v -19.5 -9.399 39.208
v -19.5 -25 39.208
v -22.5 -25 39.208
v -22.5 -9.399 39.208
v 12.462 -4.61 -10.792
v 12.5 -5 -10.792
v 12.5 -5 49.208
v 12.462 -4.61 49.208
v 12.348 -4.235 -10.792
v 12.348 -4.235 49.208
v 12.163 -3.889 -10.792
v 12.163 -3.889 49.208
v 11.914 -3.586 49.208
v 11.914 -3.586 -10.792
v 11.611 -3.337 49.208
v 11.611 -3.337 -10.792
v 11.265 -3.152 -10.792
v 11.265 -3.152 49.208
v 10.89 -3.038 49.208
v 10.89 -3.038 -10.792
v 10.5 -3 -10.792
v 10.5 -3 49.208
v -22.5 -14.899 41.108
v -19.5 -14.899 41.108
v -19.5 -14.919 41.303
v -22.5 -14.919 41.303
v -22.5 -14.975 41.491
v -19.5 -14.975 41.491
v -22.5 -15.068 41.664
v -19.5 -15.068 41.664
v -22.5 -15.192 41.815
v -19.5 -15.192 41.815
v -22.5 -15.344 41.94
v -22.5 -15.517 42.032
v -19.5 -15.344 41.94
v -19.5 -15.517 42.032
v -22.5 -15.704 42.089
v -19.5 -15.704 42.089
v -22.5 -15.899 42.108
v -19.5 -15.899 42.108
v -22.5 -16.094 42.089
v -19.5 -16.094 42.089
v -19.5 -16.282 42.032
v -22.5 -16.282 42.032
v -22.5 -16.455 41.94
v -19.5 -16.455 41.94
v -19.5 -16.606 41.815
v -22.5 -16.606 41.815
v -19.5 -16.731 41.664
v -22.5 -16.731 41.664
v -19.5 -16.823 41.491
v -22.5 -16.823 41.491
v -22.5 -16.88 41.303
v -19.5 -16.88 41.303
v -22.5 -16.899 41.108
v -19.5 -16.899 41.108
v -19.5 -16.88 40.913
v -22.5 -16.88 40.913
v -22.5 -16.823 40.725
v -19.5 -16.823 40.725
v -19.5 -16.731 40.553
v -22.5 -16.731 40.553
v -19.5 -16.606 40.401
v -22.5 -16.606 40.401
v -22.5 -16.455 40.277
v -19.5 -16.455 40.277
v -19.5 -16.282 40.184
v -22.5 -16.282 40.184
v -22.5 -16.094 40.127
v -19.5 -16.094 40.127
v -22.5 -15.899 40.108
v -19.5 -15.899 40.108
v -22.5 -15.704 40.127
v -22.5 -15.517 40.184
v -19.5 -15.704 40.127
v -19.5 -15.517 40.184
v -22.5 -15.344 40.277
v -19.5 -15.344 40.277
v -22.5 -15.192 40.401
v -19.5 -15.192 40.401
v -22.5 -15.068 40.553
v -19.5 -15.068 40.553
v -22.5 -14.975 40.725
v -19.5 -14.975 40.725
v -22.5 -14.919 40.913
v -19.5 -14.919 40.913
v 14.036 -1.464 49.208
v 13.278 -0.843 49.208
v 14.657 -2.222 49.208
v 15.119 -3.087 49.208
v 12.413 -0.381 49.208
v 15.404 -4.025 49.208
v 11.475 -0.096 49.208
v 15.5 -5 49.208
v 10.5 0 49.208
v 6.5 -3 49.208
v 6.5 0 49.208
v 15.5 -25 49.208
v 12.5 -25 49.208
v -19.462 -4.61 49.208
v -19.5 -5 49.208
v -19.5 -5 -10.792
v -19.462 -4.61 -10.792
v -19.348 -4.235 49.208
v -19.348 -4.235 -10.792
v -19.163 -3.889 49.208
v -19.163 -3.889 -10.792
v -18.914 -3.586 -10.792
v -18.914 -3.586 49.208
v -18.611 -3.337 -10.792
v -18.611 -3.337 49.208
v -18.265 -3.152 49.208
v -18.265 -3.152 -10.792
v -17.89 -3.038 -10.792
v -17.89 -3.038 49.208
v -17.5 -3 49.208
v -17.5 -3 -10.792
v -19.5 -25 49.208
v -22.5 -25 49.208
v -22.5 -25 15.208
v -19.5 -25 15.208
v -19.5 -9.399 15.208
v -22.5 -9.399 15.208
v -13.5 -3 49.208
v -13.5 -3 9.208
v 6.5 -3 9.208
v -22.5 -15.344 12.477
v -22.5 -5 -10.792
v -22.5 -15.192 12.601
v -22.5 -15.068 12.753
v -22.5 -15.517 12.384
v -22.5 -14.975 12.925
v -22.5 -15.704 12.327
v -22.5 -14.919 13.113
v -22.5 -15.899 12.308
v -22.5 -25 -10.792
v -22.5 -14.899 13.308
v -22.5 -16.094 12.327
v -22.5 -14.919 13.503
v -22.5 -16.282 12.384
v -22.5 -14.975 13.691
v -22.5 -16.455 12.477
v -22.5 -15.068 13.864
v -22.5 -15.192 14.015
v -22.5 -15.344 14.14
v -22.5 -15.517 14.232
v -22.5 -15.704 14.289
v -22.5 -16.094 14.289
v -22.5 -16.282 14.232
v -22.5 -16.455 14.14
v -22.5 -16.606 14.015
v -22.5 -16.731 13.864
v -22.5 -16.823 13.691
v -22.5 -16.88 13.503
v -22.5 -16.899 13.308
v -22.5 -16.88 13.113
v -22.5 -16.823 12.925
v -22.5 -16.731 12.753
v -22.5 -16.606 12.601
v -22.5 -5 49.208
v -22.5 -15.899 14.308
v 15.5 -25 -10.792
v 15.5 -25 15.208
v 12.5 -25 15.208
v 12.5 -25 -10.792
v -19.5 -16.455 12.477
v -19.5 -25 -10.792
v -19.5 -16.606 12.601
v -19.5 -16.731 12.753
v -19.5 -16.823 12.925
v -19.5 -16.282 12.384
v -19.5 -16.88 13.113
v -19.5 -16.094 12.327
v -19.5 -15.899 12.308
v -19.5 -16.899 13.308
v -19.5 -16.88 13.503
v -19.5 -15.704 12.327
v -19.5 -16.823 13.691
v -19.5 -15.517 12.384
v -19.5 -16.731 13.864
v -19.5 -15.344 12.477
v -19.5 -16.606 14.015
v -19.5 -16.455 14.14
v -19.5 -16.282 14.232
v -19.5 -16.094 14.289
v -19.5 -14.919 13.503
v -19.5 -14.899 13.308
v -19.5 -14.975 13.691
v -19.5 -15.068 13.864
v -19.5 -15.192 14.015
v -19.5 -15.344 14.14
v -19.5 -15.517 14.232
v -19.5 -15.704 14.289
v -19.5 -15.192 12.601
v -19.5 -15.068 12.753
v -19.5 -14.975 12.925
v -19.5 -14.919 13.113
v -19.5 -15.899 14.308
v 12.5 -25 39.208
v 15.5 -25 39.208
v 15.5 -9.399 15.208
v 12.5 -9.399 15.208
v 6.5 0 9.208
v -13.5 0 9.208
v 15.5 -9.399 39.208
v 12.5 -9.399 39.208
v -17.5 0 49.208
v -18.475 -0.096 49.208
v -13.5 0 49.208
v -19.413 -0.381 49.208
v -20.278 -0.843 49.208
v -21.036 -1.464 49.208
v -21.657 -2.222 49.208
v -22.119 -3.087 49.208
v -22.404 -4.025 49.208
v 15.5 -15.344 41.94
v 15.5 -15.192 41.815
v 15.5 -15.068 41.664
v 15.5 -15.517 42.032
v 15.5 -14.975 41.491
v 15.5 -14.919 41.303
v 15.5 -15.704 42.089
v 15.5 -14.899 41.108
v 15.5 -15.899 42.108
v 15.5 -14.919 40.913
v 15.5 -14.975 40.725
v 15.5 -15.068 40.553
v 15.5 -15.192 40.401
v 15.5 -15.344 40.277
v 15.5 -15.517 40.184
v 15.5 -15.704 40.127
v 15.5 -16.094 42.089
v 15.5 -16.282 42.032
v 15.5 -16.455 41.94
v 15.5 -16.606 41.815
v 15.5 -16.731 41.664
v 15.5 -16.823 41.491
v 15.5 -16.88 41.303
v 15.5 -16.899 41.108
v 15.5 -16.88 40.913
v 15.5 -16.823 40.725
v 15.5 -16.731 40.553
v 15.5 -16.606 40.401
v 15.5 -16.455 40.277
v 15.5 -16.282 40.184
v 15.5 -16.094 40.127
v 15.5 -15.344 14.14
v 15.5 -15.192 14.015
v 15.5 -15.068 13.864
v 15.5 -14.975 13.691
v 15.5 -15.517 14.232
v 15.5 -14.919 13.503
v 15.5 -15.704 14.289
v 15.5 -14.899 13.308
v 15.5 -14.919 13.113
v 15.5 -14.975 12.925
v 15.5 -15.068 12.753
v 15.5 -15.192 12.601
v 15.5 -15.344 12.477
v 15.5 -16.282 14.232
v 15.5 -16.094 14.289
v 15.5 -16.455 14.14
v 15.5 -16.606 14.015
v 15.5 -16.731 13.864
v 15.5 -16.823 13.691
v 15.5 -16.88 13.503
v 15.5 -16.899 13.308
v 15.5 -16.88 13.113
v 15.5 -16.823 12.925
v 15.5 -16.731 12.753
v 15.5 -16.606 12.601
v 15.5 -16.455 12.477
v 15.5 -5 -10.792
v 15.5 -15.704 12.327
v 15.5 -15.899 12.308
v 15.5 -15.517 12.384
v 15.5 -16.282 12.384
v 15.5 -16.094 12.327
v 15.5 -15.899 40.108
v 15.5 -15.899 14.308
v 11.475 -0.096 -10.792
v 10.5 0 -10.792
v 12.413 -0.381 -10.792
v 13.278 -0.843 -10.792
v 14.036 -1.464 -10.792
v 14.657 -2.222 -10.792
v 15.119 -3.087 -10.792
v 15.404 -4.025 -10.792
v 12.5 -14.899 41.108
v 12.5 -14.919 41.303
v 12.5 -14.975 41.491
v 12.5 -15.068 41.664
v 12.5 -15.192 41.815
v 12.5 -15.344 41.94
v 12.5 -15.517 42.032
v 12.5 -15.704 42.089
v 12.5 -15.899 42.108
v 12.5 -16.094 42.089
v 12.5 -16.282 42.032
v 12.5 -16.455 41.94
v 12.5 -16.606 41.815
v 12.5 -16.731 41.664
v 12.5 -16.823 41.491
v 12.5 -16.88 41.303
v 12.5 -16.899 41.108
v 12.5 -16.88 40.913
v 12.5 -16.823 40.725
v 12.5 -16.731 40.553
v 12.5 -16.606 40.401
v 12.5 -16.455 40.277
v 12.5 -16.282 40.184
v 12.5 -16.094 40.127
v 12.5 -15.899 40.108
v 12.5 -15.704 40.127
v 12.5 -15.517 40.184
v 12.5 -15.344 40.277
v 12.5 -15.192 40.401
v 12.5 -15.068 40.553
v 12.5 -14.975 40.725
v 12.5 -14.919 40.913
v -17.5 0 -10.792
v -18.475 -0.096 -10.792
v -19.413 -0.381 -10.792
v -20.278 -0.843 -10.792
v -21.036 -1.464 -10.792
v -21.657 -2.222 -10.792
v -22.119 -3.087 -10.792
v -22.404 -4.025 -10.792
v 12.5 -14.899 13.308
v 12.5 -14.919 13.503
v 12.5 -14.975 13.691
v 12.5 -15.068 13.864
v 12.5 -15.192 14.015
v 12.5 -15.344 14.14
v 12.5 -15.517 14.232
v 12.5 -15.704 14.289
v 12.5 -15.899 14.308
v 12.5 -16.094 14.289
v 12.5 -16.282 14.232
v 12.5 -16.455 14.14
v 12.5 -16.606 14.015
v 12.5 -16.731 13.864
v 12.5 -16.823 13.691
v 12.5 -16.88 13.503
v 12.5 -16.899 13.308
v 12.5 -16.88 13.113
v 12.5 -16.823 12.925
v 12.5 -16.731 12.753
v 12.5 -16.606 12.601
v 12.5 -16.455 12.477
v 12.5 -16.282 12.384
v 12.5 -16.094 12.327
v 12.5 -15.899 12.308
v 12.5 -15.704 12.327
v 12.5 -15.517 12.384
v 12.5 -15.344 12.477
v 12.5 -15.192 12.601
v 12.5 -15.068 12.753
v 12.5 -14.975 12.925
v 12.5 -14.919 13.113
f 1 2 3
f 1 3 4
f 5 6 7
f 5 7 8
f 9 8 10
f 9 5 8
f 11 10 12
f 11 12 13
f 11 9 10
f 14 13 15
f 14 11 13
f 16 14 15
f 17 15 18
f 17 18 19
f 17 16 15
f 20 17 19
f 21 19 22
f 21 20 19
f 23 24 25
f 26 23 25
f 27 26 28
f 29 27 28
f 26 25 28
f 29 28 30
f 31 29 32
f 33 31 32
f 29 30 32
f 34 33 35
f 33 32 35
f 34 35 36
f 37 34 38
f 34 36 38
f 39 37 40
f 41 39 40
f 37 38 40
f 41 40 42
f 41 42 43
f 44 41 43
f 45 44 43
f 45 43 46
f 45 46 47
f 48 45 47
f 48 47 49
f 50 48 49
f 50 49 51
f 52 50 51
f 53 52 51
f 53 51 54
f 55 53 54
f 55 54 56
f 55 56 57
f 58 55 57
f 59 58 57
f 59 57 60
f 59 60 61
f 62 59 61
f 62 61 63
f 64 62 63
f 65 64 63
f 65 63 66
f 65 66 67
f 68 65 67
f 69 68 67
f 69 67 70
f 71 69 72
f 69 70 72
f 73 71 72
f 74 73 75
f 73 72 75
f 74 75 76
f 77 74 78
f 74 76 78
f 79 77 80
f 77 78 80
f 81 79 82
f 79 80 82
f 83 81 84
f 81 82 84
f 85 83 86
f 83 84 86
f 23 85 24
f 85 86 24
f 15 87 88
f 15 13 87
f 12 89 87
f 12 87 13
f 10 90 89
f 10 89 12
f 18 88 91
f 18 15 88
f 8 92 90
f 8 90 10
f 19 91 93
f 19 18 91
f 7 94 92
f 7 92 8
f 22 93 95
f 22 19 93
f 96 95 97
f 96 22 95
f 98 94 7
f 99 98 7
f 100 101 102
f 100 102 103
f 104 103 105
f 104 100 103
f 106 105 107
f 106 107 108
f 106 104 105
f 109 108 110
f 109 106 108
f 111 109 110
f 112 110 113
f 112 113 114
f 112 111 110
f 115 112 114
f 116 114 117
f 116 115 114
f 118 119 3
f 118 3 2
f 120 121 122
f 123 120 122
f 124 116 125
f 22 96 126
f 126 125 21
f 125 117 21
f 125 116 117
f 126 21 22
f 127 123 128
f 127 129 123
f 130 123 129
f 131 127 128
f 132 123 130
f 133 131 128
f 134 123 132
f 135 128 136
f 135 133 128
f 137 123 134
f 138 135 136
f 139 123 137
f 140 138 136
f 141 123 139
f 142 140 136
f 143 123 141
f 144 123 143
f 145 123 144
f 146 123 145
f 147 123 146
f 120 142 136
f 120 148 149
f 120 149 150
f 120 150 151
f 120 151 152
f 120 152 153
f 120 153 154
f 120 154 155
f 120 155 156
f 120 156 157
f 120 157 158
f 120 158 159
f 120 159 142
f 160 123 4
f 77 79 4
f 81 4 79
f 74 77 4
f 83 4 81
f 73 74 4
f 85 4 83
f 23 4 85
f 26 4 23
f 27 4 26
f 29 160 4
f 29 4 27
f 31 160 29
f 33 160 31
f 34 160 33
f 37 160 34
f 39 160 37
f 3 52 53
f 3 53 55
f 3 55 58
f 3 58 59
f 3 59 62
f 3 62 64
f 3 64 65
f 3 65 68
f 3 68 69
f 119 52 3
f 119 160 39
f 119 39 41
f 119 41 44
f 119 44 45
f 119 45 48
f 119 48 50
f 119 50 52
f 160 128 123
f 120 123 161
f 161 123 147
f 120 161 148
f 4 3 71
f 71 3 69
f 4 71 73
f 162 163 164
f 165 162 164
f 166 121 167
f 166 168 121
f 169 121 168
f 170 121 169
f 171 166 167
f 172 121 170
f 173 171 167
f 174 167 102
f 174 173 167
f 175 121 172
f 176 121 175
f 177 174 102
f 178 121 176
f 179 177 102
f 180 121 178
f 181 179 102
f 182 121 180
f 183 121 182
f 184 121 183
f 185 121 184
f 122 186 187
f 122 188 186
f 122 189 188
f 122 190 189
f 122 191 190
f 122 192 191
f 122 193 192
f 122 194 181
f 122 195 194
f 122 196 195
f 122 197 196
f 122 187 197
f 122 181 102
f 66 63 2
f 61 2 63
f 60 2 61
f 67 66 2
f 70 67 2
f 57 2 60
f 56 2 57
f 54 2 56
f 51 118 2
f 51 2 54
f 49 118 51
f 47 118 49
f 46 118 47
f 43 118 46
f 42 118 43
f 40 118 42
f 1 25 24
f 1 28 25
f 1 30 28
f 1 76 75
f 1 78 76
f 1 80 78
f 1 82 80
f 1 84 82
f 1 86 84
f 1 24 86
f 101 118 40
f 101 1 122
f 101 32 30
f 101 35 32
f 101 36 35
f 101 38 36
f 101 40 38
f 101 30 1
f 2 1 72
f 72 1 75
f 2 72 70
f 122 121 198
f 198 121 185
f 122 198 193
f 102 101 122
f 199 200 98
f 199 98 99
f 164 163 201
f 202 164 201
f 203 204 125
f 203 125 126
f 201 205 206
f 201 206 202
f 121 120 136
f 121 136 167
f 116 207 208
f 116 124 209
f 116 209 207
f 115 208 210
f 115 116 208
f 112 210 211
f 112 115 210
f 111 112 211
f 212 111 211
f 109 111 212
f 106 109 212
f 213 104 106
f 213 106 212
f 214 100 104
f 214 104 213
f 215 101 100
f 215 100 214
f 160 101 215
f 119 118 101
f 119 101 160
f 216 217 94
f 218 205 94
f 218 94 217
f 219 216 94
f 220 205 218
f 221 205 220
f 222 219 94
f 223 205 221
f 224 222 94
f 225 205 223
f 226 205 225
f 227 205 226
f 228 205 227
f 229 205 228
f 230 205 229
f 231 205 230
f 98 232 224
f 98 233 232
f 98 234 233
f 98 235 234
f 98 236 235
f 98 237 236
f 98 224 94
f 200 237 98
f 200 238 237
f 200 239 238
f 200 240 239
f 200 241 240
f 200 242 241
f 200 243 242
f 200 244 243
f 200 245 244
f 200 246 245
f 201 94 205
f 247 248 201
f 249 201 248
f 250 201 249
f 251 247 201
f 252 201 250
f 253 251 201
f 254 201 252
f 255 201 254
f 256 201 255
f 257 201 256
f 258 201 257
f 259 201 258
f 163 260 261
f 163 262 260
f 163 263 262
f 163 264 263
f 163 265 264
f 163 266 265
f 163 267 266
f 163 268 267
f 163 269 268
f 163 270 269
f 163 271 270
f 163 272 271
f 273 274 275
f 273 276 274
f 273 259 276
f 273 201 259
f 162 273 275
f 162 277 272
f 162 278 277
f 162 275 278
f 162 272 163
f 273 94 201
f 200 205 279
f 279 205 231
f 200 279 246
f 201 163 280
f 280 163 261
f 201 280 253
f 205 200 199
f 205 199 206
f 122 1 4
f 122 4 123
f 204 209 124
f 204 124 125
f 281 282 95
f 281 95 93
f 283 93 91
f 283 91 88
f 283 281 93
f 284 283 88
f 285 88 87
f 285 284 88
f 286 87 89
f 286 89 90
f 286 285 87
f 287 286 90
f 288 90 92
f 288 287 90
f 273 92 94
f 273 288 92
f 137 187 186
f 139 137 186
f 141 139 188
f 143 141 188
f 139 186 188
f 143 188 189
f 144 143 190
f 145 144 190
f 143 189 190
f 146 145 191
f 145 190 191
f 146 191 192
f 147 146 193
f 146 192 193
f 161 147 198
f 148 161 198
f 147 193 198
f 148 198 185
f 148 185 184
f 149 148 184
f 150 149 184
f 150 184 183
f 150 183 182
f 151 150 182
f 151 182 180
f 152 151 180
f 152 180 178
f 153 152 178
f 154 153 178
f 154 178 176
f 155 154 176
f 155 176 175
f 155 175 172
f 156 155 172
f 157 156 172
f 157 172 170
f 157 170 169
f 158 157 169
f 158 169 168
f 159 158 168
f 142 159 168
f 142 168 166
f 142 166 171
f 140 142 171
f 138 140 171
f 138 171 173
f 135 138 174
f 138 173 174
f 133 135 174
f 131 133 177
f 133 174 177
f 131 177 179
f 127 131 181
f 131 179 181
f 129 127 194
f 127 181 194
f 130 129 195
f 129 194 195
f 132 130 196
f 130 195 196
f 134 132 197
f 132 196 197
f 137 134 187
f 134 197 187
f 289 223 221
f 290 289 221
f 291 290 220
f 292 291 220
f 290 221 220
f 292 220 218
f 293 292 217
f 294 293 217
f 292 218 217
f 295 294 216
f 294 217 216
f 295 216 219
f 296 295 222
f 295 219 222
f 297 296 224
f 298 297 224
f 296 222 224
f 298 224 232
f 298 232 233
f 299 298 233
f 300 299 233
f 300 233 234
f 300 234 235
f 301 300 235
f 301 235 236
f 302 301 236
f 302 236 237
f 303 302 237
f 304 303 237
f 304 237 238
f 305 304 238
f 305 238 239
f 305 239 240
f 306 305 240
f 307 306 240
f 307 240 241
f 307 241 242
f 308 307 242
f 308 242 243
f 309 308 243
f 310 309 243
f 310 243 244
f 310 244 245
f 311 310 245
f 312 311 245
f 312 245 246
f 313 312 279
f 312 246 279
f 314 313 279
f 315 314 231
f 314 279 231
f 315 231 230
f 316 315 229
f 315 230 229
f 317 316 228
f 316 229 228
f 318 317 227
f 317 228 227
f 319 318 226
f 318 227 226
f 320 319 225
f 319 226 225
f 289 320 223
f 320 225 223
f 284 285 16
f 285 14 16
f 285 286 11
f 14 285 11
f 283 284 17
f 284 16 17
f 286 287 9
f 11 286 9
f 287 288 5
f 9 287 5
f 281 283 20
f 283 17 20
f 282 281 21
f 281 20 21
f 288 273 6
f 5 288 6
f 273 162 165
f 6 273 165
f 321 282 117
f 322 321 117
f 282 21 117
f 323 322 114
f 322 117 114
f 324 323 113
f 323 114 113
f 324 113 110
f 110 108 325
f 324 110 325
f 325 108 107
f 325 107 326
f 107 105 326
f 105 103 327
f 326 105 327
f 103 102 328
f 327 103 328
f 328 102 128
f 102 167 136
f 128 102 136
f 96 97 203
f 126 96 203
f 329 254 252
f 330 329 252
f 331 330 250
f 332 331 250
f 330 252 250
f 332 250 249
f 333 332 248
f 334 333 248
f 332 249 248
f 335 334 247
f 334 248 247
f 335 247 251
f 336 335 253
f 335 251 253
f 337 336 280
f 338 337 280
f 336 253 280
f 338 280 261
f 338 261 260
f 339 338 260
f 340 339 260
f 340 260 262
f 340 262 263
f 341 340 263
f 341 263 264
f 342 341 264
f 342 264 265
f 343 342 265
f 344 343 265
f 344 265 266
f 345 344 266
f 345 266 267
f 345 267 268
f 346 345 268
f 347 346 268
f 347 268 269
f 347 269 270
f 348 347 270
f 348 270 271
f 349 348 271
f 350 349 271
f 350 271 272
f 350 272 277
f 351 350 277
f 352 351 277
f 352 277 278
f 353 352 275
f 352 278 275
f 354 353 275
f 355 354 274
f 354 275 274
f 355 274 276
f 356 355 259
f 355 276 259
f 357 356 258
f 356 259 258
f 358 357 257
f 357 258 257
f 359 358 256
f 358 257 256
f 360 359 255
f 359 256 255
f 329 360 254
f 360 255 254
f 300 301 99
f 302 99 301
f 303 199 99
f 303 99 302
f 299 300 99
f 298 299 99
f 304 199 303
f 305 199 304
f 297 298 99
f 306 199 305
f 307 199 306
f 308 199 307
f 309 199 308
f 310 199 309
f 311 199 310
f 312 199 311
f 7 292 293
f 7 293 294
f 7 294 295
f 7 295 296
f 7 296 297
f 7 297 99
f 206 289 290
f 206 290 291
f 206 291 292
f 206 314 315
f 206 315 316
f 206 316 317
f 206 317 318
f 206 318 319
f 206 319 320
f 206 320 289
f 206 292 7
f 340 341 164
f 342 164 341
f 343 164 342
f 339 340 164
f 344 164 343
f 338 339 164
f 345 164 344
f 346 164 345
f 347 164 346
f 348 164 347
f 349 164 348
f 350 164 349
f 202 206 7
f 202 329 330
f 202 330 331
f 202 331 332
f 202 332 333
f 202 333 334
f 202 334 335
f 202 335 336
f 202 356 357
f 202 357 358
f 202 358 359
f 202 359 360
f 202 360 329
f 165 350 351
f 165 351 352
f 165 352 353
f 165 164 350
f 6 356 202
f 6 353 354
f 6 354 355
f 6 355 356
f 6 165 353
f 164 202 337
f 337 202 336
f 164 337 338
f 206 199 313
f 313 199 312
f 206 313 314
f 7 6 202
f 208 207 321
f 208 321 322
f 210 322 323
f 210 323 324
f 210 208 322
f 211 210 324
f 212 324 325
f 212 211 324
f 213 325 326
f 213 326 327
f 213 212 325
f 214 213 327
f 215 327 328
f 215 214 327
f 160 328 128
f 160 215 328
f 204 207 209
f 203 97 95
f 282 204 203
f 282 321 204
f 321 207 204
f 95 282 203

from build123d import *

# Parameters (mm, degrees)
SKETCH1_W                      = 32
SKETCH1_H                      = 60
BASE_FLANGE1_DEPTH             = 3
EDGE_FLANGE1_STRIP_W           = 16
EDGE_FLANGE1_STRIP_H           = 3
EDGE_FLANGE1_STRIP_CUT_DEPTH   = 60
EDGE_FLANGE1_STRIP_2_W         = 16
EDGE_FLANGE1_STRIP_2_H         = 3
EDGE_FLANGE1_STRIP_CUT_2_DEPTH = 60
EDGE_FLANGE1_DEPTH             = 60
EDGE_FLANGE1_BEND_DEPTH        = 60
SKETCH18_R                     = 1
SKETCH18_W                     = 24
SKETCH18_H                     = 13
CUT_EXTRUDE1_DEPTH             = 68.01070511
SKETCH19_W                     = 20
SKETCH19_H                     = 40
CUT_EXTRUDE2_DEPTH             = 60.604400839
SKETCH20_W                     = 24
SKETCH20_H                     = 2.600711811
CUT_EXTRUDE3_DEPTH             = 68.01070511


# Sheet-metal steps are written as plain solids
with BuildPart() as part:
    # Sketch1 → Base-Flange1 (new body)
    with BuildSketch(Plane(origin=(0, 0, 0), x_dir=(1, 0, 0), z_dir=(0, 1, 0))):
        with Locations((-3.5, -19.208074534)):
            Rectangle(SKETCH1_W, SKETCH1_H)
    extrude(amount=-BASE_FLANGE1_DEPTH)

    # Edge-Flange1 strip (across the edge) → Edge-Flange1 strip cut (cut)
    with BuildSketch(Plane(origin=(12.5, -3, -10.791925466), x_dir=(-1, 0, 0), z_dir=(0, 0, 1))):
        with Locations((-6, -1.5)):
            Rectangle(EDGE_FLANGE1_STRIP_W, EDGE_FLANGE1_STRIP_H)
    extrude(amount=EDGE_FLANGE1_STRIP_CUT_DEPTH, mode=Mode.SUBTRACT)

    # Edge-Flange1 strip 2 (across the edge) → Edge-Flange1 strip cut 2 (cut)
    with BuildSketch(Plane(origin=(-19.5, -3, 49.208074534), x_dir=(1, 0, 0), z_dir=(0, 0, -1))):
        with Locations((-6, -1.5)):
            Rectangle(EDGE_FLANGE1_STRIP_2_W, EDGE_FLANGE1_STRIP_2_H)
    extrude(amount=EDGE_FLANGE1_STRIP_CUT_2_DEPTH, mode=Mode.SUBTRACT)

    # Edge-Flange1 section (across the edge) → Edge-Flange1 (add)
    with BuildSketch(Plane(origin=(12.5, -3, -10.791925466), x_dir=(-1, 0, 0), z_dir=(0, 0, 1))):
        with BuildLine():
            Line((-3, 2), (-3, 22))
            Line((-3, 22), (0, 22))
            Line((0, 22), (0, 2))
            ThreePointArc((0, 2), (0.585786438, 0.585786438), (2, 0))
            Line((2, 0), (2, -3))
            ThreePointArc((2, -3), (-1.535533906, -1.535533906), (-3, 2))
        make_face()
    extrude(amount=EDGE_FLANGE1_DEPTH)

    # Edge-Flange1 section 2 (across the edge) → Edge-Flange1 bend (add)
    with BuildSketch(Plane(origin=(-19.5, -3, 49.208074534), x_dir=(1, 0, 0), z_dir=(0, 0, -1))):
        with BuildLine():
            Line((-3, 2), (-3, 22))
            Line((-3, 22), (0, 22))
            Line((0, 22), (0, 2))
            ThreePointArc((0, 2), (0.585786438, 0.585786438), (2, 0))
            Line((2, 0), (2, -3))
            ThreePointArc((2, -3), (-1.535533906, -1.535533906), (-3, 2))
        make_face()
    extrude(amount=EDGE_FLANGE1_BEND_DEPTH)

    # Sketch18 → Cut-Extrude1 (cut, through all)
    with BuildSketch(Plane(origin=(15.5, 0, 0), x_dir=(0, 0, -1), z_dir=(1, 0, 0))):
        with Locations(Location((-41.108074534, -15.899288189, 0), (0, 0, 90))):
            Circle(SKETCH18_R)
        with Locations(Location((-13.308074534, -15.899288189, 0), (0, 0, 90))):
            Circle(SKETCH18_R)
        with Locations((-27.208074534, -15.899288189)):
            Rectangle(SKETCH18_W, SKETCH18_H)
    extrude(amount=-CUT_EXTRUDE1_DEPTH, mode=Mode.SUBTRACT)

    # Sketch19 → Cut-Extrude2 (cut, through all)
    with BuildSketch(Plane(origin=(0, 0, 0), x_dir=(1, 0, 0), z_dir=(0, 1, 0))):
        with Locations((-3.5, -29.208074534)):
            Rectangle(SKETCH19_W, SKETCH19_H)
    extrude(amount=-CUT_EXTRUDE2_DEPTH, mode=Mode.SUBTRACT)

    # Sketch20 → Cut-Extrude3 (cut, through all)
    with BuildSketch(Plane(origin=(15.5, 0, 0), x_dir=(0, 0, -1), z_dir=(1, 0, 0))):
        with Locations((-27.208074534, -23.699644095)):
            Rectangle(SKETCH20_W, SKETCH20_H)
    extrude(amount=-CUT_EXTRUDE3_DEPTH, mode=Mode.SUBTRACT)


solid = part.part
